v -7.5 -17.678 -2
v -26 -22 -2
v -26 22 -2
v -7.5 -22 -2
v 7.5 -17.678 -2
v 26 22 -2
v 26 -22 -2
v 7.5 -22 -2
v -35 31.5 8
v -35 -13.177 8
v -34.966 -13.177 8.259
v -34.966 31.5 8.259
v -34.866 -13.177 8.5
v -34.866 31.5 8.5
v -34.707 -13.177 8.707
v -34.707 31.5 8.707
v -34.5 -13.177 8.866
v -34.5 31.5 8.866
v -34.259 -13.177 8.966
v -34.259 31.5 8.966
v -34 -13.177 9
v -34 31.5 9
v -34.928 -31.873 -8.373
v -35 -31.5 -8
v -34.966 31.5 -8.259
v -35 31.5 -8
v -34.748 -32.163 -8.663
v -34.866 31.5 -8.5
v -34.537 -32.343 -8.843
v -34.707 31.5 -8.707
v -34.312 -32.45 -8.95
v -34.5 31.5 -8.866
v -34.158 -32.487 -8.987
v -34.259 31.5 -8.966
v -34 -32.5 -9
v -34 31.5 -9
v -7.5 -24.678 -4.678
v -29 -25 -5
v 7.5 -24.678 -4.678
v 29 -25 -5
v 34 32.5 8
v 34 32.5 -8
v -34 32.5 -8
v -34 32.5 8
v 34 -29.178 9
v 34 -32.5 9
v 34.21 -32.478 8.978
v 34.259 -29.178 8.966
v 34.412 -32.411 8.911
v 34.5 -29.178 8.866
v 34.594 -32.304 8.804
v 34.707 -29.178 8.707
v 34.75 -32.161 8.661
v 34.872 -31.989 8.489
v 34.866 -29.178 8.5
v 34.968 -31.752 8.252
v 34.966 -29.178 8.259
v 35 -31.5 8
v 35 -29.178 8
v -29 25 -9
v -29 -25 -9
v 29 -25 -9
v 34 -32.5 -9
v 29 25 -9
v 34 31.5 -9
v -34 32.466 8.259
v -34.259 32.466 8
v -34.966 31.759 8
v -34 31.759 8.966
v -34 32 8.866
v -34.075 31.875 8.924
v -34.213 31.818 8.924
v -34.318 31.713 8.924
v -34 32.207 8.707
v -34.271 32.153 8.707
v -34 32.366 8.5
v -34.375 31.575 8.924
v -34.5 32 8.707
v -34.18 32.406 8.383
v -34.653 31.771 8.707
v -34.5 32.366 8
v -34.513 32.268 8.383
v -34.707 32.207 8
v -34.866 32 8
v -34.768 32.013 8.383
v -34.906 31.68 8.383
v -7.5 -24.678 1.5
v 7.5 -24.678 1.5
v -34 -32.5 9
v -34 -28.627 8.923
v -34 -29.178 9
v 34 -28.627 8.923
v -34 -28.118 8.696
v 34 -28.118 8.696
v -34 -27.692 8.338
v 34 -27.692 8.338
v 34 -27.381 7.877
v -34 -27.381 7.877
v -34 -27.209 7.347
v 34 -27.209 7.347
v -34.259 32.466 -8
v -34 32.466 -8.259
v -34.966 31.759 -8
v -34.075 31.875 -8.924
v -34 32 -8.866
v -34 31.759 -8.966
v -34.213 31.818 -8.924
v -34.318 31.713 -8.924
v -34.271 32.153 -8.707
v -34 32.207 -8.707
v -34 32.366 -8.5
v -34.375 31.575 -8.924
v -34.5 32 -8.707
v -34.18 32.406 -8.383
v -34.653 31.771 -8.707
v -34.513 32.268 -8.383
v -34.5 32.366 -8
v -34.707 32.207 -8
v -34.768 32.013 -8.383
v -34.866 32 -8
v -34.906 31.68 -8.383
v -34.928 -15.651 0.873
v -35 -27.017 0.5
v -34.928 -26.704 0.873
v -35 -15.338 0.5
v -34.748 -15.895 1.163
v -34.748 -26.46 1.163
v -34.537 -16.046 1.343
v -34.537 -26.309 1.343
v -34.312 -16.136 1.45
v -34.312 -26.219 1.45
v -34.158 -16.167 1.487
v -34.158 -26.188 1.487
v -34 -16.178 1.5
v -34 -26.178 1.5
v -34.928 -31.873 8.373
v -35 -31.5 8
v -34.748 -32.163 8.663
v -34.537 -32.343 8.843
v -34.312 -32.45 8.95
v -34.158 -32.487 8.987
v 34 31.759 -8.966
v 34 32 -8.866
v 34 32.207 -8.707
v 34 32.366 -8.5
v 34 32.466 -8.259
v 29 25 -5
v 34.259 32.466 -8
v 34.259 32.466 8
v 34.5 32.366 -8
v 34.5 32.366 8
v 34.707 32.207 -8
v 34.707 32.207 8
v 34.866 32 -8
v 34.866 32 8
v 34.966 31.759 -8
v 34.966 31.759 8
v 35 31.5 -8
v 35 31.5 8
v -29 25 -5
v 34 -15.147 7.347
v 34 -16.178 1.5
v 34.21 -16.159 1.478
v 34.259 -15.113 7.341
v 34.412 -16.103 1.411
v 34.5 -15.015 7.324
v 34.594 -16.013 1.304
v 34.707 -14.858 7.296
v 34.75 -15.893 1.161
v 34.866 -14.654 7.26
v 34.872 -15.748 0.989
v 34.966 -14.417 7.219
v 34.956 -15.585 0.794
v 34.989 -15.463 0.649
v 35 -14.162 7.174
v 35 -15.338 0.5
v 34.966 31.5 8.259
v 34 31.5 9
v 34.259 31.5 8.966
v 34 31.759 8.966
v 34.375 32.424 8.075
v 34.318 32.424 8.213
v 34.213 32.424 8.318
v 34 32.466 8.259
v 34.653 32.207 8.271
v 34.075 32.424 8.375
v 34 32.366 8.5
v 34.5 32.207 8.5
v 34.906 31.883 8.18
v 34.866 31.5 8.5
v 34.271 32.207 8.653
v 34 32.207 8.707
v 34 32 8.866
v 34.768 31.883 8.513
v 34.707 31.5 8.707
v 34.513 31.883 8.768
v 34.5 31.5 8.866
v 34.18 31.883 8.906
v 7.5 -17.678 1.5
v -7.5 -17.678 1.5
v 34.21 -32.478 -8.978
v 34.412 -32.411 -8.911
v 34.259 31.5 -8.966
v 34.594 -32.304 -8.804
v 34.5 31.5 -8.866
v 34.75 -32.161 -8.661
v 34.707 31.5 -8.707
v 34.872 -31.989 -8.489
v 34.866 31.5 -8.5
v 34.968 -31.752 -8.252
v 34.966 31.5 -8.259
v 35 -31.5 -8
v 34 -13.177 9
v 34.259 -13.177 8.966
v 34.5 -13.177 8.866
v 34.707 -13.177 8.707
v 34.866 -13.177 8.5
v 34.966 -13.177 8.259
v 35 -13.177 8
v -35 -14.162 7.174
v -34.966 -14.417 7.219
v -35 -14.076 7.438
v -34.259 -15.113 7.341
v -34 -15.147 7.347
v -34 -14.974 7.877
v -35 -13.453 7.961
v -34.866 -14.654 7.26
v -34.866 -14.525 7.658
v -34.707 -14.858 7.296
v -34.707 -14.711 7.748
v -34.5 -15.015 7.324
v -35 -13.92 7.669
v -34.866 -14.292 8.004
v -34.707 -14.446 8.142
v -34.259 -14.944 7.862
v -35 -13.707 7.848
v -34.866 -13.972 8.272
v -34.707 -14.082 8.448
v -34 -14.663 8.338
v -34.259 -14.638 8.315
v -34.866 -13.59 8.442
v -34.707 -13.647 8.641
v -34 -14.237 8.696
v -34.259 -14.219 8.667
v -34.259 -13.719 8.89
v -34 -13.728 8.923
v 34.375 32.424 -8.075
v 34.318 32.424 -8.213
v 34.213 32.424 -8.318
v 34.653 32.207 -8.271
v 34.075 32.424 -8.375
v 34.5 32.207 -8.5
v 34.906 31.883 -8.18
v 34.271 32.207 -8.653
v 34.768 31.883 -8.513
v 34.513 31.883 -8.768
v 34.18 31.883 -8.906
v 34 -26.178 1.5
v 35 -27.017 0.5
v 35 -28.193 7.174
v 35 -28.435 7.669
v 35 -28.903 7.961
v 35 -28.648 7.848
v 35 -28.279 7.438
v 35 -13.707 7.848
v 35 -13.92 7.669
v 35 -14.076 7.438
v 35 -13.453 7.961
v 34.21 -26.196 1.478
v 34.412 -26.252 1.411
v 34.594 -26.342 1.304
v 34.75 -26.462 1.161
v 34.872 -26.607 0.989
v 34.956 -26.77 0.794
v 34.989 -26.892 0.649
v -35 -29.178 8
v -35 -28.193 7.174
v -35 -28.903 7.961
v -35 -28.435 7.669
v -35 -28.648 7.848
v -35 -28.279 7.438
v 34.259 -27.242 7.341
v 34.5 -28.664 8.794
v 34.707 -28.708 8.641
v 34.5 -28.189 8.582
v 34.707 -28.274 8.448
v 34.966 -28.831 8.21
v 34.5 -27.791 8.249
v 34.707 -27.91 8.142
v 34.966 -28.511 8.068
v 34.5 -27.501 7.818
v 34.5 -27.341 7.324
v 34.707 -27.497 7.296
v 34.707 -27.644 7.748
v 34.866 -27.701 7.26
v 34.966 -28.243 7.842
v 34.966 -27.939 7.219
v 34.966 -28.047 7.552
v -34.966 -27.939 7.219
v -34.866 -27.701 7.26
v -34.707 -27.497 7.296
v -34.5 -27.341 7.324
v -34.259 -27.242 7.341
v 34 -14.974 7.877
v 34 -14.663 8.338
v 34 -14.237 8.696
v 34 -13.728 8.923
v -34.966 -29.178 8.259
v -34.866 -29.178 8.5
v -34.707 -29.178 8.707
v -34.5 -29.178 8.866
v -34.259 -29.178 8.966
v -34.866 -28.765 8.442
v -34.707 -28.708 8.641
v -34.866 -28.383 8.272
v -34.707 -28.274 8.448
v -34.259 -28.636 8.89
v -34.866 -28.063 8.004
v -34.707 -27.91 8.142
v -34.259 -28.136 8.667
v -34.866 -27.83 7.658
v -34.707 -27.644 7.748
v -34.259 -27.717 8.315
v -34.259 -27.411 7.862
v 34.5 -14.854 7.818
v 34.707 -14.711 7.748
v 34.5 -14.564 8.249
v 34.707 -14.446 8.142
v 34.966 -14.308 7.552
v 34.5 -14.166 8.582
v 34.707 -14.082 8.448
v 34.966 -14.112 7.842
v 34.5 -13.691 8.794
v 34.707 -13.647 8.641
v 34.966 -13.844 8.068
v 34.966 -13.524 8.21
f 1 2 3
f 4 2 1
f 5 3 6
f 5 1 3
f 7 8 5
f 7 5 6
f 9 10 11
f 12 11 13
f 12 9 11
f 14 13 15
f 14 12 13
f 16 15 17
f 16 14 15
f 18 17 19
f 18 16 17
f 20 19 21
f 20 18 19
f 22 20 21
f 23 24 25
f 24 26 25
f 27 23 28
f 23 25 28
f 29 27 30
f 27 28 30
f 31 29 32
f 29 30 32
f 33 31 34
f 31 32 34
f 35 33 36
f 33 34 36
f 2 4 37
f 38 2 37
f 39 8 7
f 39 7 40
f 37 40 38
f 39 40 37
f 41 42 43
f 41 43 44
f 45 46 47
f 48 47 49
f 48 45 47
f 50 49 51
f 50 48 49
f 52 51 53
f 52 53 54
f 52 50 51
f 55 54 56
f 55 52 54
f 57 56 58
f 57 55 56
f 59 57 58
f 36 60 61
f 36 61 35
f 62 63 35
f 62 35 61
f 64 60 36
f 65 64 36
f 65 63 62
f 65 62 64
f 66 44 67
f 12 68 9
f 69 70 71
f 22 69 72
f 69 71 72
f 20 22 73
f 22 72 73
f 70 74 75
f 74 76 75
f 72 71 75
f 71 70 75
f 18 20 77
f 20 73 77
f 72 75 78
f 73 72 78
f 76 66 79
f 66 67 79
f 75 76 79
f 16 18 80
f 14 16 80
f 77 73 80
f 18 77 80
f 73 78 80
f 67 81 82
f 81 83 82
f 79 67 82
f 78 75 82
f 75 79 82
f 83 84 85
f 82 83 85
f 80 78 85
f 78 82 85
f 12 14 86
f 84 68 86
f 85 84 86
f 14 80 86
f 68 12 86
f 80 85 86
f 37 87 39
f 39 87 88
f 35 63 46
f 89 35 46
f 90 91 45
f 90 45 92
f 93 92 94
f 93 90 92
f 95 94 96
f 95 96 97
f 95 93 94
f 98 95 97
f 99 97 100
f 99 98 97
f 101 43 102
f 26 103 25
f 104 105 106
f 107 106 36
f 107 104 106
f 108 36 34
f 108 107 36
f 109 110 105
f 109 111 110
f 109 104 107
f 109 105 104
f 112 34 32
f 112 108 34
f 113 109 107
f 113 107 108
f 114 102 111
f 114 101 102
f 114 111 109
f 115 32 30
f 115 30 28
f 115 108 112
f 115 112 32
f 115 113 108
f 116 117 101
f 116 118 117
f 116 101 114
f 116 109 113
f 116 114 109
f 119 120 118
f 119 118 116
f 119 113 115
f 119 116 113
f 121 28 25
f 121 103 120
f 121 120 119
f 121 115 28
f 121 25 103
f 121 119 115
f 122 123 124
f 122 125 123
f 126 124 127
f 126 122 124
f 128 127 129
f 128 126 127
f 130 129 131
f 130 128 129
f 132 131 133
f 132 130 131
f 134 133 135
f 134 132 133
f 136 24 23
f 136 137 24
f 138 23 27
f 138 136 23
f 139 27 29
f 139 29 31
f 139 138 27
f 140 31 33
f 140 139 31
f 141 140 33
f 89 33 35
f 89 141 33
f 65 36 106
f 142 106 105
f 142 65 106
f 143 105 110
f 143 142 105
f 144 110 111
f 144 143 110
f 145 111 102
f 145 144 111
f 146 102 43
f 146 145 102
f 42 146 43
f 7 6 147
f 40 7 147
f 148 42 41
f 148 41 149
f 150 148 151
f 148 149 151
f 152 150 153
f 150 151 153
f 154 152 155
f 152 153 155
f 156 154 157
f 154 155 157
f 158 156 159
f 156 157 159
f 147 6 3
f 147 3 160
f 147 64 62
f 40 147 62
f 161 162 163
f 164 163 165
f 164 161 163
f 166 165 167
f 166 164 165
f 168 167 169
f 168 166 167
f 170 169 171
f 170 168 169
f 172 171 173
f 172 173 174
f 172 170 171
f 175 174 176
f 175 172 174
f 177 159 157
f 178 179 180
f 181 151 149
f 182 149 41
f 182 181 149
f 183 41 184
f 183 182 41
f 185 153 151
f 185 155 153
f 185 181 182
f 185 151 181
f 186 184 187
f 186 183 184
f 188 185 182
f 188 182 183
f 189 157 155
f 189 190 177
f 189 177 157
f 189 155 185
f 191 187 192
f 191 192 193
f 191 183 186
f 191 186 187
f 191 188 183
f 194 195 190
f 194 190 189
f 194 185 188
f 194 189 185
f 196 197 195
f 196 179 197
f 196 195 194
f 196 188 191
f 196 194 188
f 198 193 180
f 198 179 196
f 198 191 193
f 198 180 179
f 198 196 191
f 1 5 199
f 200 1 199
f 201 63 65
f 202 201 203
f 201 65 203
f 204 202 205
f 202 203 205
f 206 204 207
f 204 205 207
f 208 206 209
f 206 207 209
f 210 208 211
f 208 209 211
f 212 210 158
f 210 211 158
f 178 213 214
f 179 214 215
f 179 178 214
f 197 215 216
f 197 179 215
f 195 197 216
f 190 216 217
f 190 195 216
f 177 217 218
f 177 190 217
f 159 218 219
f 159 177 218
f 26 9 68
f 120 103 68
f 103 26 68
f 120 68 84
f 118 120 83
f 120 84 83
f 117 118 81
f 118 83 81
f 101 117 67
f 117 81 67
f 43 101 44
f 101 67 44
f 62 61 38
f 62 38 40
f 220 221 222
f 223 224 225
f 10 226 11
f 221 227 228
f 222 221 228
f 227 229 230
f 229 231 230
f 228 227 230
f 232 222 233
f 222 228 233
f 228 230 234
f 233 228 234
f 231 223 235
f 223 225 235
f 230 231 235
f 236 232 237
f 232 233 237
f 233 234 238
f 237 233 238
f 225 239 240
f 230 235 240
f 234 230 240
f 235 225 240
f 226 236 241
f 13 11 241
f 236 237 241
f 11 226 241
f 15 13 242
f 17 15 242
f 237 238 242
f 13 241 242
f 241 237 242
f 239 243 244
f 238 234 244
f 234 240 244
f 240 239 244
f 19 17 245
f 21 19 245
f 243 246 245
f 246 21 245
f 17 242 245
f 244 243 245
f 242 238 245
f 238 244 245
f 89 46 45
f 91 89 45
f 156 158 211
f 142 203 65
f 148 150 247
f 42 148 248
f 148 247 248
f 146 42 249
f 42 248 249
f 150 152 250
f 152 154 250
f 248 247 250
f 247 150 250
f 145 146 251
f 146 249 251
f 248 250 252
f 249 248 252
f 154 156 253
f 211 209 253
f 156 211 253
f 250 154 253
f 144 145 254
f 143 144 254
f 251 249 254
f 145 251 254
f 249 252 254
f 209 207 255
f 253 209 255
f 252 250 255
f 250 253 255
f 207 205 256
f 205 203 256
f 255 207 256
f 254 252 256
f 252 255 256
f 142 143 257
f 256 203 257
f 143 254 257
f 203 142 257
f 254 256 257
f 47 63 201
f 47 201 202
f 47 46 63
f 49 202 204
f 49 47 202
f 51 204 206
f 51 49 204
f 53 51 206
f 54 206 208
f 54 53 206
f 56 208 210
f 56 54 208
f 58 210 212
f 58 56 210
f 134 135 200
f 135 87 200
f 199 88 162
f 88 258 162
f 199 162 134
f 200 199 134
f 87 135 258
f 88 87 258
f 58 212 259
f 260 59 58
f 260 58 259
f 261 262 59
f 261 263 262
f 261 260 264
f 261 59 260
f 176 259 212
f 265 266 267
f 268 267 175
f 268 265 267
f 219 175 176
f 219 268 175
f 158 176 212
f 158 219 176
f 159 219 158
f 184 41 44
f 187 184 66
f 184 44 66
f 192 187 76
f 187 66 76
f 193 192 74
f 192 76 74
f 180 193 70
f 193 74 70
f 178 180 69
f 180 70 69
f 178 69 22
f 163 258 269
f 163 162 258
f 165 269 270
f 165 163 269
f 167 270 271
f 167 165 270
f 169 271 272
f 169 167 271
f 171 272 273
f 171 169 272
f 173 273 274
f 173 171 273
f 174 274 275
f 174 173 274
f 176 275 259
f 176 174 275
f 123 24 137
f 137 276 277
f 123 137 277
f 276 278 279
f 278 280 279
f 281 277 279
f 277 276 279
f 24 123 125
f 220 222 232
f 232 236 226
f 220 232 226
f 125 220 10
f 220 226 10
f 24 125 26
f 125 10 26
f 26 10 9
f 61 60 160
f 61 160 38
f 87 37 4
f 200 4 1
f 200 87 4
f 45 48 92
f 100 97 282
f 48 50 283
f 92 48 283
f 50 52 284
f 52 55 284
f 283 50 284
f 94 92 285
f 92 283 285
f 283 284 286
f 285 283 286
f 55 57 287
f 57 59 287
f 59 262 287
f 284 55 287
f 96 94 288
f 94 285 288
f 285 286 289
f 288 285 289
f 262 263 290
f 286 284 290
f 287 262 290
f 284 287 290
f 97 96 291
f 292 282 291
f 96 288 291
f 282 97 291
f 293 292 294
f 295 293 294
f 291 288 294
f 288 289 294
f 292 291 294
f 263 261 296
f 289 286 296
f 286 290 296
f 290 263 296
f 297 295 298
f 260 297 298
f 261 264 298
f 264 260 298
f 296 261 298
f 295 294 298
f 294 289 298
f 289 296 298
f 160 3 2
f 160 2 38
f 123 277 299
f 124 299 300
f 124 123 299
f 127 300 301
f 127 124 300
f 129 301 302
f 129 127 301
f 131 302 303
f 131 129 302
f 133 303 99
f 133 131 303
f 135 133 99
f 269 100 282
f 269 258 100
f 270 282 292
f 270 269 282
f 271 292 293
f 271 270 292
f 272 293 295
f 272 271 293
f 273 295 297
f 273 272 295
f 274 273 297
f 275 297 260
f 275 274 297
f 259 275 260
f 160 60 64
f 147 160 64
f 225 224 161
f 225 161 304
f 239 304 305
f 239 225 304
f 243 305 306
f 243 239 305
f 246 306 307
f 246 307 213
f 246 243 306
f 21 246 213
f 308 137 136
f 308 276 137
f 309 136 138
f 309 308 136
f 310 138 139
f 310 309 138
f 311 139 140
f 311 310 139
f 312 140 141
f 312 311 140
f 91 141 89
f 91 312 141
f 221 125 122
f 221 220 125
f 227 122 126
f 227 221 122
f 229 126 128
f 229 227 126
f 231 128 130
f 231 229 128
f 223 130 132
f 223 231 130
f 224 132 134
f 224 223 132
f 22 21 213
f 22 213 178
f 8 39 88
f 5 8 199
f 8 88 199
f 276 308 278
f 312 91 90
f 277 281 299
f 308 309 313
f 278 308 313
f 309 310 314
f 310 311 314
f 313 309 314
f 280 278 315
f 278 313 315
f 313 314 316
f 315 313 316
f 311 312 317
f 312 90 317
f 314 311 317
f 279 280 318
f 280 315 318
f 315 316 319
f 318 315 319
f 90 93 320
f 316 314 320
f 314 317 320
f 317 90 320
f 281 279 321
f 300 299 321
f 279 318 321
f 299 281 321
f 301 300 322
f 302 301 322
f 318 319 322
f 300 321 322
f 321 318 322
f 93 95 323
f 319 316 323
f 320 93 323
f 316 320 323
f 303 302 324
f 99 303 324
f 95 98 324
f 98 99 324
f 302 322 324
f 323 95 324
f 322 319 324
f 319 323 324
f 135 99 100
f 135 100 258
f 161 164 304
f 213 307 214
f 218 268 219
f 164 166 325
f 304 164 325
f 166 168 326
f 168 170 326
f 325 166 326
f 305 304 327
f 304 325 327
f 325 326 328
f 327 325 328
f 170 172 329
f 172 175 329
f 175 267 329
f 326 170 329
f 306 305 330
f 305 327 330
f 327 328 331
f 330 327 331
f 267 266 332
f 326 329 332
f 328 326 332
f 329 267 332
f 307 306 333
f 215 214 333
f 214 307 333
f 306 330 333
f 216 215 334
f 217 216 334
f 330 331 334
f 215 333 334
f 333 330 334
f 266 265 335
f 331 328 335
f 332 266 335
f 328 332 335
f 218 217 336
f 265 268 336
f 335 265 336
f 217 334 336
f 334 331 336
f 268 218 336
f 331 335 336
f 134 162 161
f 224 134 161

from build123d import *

# Parameters (mm, degrees)
F0_W          = 65
F0_H          = 18
F1_DEPTH      = 35
F3_DEPTH      = 70.001
F4_R          = 2
F5_R          = 1
F6_W          = 7
F6_H          = 3
F7_DEPTH      = 7.5
F8_W          = 58
F8_H          = 50
F9_DEPTH      = 7
F10_T1_DEPTH  = 50
F10_T3_DEPTH  = 58
F10_T8_DEPTH  = 65.7150489639
F10_T13_DEPTH = 58
F10_T18_DEPTH = 65.7150489639


# Not quite as in the source:
# - a fillet or chamfer that OpenCascade refuses, or shapes differently, is made with other operations: its cross-section is extruded or revolved along the edge and cut away or added


with BuildPart() as f1:
    # F0 (on Right) → F1 (new body, symmetric)
    with BuildSketch(Plane.YZ):
        Rectangle(F0_W, F0_H)
    extrude(amount=F1_DEPTH, both=True)

    # F2 (on face) → F3 (cut, through all)
    with BuildSketch(Plane.YZ.offset(35)):
        Polygon((-14.8550952894, 9), (-27.5, 9), (-26.1775476447, 1.5), (-16.1775476447, 1.5), align=None)
        Polygon((-21.5490479022, 13.5265095159), (-32.5, 9), (-27.5, 9), (-14.8550952894, 9), align=None)
    extrude(amount=-F3_DEPTH, mode=Mode.SUBTRACT)

    # F4
    f4_edges = [f1.edges().sort_by_distance(p)[0] for p in [
        (0, -14.855095, 9),
        (0, -27.5, 9),
    ]]
    fillet(f4_edges, radius=F4_R)

    # F5
    f5_edges = [f1.edges().sort_by_distance(p)[0] for p in [
        (35, 9.661552, 9),
        (35, -30.8391, 9),
        (35, -27.892624, 8.532089),
        (35, -32.5, 0),
        (35, -26.693066, 4.423648),
        (35, 0, -9),
        (35, -21.177548, 1.5),
        (35, 32.5, 0),
        (35, -15.66203, 4.423648),
        (35, -14.462471, 8.532089),
        (-35, 32.5, 0),
        (0, 32.5, 9),
        (0, 32.5, -9),
        (-35, -30.8391, 9),
        (-35, -27.892624, 8.532089),
        (-35, -32.5, 0),
        (-35, -26.693066, 4.423648),
        (-35, 0, -9),
        (-35, -21.177548, 1.5),
        (-35, -15.66203, 4.423648),
        (-35, 9.661552, 9),
        (-35, -14.462471, 8.532089),
    ]]
    fillet(f5_edges, radius=F5_R)

    # F6 (on Right) → F7 (cut, symmetric)
    with BuildSketch(Plane.YZ):
        with Locations((-21.1775476447, -1)):
            Rectangle(F6_W, F6_H)
        with Locations((-21.1775476447, 2)):
            Rectangle(F6_W, F6_H)
    extrude(amount=F7_DEPTH, both=True, mode=Mode.SUBTRACT)

    # F8 (on face) → F9 (cut)
    with BuildSketch(Plane(origin=(0, 0, -9), x_dir=(1, 0, 0), z_dir=(0, 0, -1))):
        Rectangle(F8_W, F8_H)
    extrude(amount=-F9_DEPTH, mode=Mode.SUBTRACT)

    # F10: chamfer of 3 on 4 edges, made by hand

    # F10_s2 → F10_t1 (join)
    with BuildSketch(Plane.XZ.offset(-25)):
        Polygon((26, -2), (29, -5), (29, -2), align=None)
        Polygon((-26, -2), (-29, -5), (-29, -2), align=None)
    extrude(amount=F10_T1_DEPTH)

    # F10_s4 → F10_t3 (join)
    with BuildSketch(Plane.YZ.offset(-29)):
        Polygon((22, -2), (25, -5), (25, -2), align=None)
    extrude(amount=F10_T3_DEPTH)


with BuildPart() as f10_tool6:
    # F10_s7 → F10_t8 (new body)
    with BuildSketch(Plane.YZ.offset(29)):
        Polygon((-22, -2), (-25, -5), (-25, -2), align=None)
    extrude(amount=-F10_T8_DEPTH)

    split(bisect_by=Plane.YZ.offset(7.5), keep=Keep.TOP)


with BuildPart() as f1_1:
    add(f1.part)

    # F10_t5: union F10_tool6
    add(f10_tool6.part)


with BuildPart() as f10_tool11:
    # F10_s12 → F10_t13 (new body)
    with BuildSketch(Plane.YZ.offset(29)):
        Polygon((-22, -2), (-25, -5), (-25, -2), align=None)
    extrude(amount=-F10_T13_DEPTH)

    split(bisect_by=Plane.XZ.offset(24.6775476447), keep=Keep.TOP)


with BuildPart() as f1_2:
    add(f1_1.part)

    # F10_t10: union F10_tool11
    add(f10_tool11.part)


with BuildPart() as f10_tool16:
    # F10_s17 → F10_t18 (new body)
    with BuildSketch(Plane.YZ.offset(36.7150489639)):
        Polygon((-22, -2), (-25, -5), (-25, -2), align=None)
    extrude(amount=-F10_T18_DEPTH)

    split(bisect_by=Plane.YZ.offset(-7.5), keep=Keep.BOTTOM)


with BuildPart() as f1_3:
    add(f1_2.part)

    # F10_t15: union F10_tool16
    add(f10_tool16.part)


solid = f1_3.part
